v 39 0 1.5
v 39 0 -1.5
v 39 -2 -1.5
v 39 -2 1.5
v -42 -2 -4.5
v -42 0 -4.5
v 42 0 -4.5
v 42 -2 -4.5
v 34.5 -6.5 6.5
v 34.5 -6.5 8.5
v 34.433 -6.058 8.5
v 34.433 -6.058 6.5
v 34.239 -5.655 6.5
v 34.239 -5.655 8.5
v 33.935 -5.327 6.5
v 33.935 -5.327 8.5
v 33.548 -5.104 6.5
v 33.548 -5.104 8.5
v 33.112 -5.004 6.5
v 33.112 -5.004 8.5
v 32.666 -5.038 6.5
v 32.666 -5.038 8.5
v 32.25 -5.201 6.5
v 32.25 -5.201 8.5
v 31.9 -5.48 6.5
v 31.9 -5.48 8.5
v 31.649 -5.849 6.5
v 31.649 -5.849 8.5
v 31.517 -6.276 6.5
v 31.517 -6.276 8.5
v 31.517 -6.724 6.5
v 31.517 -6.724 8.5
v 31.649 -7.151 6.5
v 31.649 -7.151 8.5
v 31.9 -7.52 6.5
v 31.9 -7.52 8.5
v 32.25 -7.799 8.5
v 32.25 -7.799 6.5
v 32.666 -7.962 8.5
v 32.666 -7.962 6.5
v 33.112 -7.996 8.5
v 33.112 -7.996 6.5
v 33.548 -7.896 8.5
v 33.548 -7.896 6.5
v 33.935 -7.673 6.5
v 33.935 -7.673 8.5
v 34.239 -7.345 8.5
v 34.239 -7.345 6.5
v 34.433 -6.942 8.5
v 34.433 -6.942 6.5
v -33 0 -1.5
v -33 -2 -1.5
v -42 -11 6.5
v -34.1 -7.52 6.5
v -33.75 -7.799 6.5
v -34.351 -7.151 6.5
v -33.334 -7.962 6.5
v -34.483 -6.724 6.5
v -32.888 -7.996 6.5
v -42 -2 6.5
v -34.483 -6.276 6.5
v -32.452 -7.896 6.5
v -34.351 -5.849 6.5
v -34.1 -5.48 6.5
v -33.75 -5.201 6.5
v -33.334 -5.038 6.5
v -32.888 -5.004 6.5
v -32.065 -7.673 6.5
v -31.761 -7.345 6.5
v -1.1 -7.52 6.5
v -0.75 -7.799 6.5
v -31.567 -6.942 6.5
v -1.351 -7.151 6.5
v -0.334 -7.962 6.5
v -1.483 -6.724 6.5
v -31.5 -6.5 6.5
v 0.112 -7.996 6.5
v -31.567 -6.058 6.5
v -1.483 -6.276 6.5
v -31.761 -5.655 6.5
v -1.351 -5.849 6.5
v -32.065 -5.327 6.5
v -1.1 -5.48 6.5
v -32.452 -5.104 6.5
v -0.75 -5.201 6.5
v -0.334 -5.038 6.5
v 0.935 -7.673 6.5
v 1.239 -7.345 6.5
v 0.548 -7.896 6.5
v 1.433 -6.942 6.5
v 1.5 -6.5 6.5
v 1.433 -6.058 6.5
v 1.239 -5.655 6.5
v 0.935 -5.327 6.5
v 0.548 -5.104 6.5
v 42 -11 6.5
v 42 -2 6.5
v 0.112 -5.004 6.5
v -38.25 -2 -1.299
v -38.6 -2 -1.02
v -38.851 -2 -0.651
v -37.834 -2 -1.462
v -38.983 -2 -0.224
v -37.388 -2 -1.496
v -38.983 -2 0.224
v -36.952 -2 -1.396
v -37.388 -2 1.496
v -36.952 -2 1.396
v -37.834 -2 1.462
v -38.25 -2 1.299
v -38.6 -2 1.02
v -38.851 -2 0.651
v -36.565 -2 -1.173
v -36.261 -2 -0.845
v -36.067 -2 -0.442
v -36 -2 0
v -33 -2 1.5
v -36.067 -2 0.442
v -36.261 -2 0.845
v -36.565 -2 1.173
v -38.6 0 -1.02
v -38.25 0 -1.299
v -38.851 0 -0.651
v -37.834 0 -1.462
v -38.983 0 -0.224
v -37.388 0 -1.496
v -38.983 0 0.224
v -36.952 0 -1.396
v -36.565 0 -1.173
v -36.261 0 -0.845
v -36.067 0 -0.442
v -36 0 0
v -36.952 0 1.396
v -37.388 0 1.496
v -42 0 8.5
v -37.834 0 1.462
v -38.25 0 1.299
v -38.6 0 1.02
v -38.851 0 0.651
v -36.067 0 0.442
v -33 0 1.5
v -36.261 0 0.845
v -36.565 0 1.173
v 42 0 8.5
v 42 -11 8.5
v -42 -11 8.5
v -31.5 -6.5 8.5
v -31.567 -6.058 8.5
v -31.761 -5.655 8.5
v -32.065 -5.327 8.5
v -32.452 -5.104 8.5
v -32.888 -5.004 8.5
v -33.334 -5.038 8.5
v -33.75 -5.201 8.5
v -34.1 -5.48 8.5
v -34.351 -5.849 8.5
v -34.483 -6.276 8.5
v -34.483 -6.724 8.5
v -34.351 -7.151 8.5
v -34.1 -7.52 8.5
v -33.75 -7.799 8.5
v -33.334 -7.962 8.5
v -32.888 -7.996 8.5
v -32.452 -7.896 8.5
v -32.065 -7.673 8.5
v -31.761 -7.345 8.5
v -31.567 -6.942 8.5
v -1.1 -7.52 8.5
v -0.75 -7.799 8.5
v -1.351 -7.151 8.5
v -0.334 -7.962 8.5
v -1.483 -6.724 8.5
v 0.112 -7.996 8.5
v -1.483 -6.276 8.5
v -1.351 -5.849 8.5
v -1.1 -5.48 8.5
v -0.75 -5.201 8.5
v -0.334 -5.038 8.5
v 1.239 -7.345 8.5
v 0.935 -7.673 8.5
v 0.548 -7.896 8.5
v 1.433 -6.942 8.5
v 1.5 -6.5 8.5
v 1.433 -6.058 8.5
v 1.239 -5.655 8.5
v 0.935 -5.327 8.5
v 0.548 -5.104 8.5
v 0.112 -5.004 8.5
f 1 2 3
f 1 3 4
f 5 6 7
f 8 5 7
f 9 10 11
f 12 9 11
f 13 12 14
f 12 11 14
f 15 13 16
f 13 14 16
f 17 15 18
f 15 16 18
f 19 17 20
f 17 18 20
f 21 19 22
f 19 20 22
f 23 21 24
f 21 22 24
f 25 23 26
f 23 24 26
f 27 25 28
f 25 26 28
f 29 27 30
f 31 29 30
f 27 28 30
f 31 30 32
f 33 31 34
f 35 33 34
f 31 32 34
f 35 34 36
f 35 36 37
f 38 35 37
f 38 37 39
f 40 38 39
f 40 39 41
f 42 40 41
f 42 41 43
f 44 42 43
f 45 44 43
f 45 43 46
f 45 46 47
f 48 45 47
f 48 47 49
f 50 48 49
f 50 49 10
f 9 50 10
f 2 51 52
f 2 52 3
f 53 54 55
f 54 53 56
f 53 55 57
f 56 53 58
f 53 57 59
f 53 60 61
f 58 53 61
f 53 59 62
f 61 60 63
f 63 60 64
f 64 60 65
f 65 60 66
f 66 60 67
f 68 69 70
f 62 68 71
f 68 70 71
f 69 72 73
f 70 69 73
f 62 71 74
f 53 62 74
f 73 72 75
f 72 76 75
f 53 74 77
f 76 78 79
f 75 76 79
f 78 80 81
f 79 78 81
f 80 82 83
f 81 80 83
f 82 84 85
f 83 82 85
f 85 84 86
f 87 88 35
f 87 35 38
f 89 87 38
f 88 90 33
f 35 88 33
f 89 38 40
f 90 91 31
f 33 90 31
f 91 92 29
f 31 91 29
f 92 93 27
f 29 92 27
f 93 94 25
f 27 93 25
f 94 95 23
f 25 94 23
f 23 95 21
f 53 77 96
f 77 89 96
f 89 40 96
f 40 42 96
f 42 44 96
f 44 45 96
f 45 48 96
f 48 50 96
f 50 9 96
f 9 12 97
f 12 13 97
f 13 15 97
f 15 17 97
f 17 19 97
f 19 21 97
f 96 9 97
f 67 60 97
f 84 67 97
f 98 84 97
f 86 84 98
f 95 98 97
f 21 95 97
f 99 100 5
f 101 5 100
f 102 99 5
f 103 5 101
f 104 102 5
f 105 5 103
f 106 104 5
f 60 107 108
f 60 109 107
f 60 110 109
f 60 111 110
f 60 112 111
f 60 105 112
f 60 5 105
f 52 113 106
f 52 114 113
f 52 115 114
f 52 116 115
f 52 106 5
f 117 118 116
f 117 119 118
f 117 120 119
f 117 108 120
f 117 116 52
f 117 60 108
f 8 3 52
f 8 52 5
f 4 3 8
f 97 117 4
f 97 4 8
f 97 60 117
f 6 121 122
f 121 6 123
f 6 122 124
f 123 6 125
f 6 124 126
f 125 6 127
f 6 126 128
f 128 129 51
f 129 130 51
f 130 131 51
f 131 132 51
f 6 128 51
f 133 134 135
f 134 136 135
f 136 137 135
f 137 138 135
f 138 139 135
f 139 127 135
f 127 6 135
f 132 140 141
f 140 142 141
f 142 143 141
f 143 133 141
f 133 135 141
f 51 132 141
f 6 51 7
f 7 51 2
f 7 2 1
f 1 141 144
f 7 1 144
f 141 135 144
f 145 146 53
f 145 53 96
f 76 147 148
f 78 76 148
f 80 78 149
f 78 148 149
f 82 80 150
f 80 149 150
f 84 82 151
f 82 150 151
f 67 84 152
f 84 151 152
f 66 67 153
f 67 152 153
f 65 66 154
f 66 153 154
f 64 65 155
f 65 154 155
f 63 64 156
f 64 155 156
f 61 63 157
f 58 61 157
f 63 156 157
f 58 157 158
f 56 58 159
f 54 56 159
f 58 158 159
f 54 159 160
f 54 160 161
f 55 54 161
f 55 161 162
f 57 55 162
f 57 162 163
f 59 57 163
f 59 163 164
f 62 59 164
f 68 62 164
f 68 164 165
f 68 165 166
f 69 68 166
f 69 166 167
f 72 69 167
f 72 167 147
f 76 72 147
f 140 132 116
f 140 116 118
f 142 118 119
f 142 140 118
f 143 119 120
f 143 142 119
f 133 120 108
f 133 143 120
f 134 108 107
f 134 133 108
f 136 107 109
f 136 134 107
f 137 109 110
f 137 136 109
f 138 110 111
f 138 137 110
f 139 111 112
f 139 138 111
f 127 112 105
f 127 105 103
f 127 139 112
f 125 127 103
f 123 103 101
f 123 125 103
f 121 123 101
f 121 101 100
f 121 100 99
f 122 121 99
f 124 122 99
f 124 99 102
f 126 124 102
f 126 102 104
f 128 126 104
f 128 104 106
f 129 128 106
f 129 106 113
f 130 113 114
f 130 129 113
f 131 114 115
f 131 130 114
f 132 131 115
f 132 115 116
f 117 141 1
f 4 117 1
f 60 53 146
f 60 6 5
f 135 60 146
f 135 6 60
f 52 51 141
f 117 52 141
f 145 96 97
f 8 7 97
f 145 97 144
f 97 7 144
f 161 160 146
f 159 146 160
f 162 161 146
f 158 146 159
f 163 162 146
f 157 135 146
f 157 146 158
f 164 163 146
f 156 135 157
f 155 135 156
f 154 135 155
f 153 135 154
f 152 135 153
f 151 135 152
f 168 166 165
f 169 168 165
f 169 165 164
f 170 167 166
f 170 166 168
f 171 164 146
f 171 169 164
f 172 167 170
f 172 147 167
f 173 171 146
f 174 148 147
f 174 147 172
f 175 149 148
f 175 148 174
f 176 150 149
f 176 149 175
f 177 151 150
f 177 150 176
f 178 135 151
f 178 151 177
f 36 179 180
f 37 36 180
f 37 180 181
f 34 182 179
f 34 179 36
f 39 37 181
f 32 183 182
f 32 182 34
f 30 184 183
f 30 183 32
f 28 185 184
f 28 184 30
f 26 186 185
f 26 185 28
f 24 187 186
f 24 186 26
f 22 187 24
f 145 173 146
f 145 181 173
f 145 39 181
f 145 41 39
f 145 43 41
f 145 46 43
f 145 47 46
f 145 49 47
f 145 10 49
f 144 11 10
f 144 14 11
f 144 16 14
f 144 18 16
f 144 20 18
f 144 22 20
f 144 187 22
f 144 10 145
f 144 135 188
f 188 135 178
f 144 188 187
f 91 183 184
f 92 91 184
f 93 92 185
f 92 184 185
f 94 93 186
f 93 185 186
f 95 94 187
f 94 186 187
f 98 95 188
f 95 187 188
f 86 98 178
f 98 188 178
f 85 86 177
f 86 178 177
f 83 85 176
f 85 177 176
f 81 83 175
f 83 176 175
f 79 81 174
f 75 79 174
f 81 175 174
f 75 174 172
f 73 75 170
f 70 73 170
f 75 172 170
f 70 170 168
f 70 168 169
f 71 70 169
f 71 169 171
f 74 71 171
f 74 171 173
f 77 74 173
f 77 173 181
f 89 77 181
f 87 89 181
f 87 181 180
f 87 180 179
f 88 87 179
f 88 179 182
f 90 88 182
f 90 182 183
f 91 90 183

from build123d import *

# Parameters (mm, degrees)
F0_W     = 84
F0_H     = 9
F0_R     = 1.5
F0_W_2   = 72
F0_H_2   = 3
F0_H_3   = 4
F1_DEPTH = 2
F2_W     = 84
F2_H     = 2
F3_DEPTH = 9
F4_R     = 1.5
F5_DEPTH = 25


with BuildPart() as f1:
    # F0 (on Front) → F1 (new body)
    with BuildSketch(Plane.XZ):
        Rectangle(F0_W, F0_H)
        with Locations((-37.5, 0)):
            Circle(F0_R, mode=Mode.SUBTRACT)
        with Locations((3, 0)):
            Rectangle(F0_W_2, F0_H_2, mode=Mode.SUBTRACT)
        with Locations((0, 6.5)):
            Rectangle(F0_W, F0_H_3)
    extrude(amount=F1_DEPTH)

    # F2 (on face) → F3 (join)
    with BuildSketch(Plane.XZ.offset(2)):
        with Locations((0, 7.5)):
            Rectangle(F2_W, F2_H)
    extrude(amount=F3_DEPTH)

    # F4 (on face) → F5 (cut)
    with BuildSketch(Plane.XY.offset(8.5)):
        with Locations((0, -6.5)):
            Circle(F4_R)
        with Locations((33, -6.5)):
            Circle(F4_R)
        with Locations((-33, -6.5)):
            Circle(F4_R)
    extrude(amount=-F5_DEPTH, mode=Mode.SUBTRACT)


solid = f1.part
